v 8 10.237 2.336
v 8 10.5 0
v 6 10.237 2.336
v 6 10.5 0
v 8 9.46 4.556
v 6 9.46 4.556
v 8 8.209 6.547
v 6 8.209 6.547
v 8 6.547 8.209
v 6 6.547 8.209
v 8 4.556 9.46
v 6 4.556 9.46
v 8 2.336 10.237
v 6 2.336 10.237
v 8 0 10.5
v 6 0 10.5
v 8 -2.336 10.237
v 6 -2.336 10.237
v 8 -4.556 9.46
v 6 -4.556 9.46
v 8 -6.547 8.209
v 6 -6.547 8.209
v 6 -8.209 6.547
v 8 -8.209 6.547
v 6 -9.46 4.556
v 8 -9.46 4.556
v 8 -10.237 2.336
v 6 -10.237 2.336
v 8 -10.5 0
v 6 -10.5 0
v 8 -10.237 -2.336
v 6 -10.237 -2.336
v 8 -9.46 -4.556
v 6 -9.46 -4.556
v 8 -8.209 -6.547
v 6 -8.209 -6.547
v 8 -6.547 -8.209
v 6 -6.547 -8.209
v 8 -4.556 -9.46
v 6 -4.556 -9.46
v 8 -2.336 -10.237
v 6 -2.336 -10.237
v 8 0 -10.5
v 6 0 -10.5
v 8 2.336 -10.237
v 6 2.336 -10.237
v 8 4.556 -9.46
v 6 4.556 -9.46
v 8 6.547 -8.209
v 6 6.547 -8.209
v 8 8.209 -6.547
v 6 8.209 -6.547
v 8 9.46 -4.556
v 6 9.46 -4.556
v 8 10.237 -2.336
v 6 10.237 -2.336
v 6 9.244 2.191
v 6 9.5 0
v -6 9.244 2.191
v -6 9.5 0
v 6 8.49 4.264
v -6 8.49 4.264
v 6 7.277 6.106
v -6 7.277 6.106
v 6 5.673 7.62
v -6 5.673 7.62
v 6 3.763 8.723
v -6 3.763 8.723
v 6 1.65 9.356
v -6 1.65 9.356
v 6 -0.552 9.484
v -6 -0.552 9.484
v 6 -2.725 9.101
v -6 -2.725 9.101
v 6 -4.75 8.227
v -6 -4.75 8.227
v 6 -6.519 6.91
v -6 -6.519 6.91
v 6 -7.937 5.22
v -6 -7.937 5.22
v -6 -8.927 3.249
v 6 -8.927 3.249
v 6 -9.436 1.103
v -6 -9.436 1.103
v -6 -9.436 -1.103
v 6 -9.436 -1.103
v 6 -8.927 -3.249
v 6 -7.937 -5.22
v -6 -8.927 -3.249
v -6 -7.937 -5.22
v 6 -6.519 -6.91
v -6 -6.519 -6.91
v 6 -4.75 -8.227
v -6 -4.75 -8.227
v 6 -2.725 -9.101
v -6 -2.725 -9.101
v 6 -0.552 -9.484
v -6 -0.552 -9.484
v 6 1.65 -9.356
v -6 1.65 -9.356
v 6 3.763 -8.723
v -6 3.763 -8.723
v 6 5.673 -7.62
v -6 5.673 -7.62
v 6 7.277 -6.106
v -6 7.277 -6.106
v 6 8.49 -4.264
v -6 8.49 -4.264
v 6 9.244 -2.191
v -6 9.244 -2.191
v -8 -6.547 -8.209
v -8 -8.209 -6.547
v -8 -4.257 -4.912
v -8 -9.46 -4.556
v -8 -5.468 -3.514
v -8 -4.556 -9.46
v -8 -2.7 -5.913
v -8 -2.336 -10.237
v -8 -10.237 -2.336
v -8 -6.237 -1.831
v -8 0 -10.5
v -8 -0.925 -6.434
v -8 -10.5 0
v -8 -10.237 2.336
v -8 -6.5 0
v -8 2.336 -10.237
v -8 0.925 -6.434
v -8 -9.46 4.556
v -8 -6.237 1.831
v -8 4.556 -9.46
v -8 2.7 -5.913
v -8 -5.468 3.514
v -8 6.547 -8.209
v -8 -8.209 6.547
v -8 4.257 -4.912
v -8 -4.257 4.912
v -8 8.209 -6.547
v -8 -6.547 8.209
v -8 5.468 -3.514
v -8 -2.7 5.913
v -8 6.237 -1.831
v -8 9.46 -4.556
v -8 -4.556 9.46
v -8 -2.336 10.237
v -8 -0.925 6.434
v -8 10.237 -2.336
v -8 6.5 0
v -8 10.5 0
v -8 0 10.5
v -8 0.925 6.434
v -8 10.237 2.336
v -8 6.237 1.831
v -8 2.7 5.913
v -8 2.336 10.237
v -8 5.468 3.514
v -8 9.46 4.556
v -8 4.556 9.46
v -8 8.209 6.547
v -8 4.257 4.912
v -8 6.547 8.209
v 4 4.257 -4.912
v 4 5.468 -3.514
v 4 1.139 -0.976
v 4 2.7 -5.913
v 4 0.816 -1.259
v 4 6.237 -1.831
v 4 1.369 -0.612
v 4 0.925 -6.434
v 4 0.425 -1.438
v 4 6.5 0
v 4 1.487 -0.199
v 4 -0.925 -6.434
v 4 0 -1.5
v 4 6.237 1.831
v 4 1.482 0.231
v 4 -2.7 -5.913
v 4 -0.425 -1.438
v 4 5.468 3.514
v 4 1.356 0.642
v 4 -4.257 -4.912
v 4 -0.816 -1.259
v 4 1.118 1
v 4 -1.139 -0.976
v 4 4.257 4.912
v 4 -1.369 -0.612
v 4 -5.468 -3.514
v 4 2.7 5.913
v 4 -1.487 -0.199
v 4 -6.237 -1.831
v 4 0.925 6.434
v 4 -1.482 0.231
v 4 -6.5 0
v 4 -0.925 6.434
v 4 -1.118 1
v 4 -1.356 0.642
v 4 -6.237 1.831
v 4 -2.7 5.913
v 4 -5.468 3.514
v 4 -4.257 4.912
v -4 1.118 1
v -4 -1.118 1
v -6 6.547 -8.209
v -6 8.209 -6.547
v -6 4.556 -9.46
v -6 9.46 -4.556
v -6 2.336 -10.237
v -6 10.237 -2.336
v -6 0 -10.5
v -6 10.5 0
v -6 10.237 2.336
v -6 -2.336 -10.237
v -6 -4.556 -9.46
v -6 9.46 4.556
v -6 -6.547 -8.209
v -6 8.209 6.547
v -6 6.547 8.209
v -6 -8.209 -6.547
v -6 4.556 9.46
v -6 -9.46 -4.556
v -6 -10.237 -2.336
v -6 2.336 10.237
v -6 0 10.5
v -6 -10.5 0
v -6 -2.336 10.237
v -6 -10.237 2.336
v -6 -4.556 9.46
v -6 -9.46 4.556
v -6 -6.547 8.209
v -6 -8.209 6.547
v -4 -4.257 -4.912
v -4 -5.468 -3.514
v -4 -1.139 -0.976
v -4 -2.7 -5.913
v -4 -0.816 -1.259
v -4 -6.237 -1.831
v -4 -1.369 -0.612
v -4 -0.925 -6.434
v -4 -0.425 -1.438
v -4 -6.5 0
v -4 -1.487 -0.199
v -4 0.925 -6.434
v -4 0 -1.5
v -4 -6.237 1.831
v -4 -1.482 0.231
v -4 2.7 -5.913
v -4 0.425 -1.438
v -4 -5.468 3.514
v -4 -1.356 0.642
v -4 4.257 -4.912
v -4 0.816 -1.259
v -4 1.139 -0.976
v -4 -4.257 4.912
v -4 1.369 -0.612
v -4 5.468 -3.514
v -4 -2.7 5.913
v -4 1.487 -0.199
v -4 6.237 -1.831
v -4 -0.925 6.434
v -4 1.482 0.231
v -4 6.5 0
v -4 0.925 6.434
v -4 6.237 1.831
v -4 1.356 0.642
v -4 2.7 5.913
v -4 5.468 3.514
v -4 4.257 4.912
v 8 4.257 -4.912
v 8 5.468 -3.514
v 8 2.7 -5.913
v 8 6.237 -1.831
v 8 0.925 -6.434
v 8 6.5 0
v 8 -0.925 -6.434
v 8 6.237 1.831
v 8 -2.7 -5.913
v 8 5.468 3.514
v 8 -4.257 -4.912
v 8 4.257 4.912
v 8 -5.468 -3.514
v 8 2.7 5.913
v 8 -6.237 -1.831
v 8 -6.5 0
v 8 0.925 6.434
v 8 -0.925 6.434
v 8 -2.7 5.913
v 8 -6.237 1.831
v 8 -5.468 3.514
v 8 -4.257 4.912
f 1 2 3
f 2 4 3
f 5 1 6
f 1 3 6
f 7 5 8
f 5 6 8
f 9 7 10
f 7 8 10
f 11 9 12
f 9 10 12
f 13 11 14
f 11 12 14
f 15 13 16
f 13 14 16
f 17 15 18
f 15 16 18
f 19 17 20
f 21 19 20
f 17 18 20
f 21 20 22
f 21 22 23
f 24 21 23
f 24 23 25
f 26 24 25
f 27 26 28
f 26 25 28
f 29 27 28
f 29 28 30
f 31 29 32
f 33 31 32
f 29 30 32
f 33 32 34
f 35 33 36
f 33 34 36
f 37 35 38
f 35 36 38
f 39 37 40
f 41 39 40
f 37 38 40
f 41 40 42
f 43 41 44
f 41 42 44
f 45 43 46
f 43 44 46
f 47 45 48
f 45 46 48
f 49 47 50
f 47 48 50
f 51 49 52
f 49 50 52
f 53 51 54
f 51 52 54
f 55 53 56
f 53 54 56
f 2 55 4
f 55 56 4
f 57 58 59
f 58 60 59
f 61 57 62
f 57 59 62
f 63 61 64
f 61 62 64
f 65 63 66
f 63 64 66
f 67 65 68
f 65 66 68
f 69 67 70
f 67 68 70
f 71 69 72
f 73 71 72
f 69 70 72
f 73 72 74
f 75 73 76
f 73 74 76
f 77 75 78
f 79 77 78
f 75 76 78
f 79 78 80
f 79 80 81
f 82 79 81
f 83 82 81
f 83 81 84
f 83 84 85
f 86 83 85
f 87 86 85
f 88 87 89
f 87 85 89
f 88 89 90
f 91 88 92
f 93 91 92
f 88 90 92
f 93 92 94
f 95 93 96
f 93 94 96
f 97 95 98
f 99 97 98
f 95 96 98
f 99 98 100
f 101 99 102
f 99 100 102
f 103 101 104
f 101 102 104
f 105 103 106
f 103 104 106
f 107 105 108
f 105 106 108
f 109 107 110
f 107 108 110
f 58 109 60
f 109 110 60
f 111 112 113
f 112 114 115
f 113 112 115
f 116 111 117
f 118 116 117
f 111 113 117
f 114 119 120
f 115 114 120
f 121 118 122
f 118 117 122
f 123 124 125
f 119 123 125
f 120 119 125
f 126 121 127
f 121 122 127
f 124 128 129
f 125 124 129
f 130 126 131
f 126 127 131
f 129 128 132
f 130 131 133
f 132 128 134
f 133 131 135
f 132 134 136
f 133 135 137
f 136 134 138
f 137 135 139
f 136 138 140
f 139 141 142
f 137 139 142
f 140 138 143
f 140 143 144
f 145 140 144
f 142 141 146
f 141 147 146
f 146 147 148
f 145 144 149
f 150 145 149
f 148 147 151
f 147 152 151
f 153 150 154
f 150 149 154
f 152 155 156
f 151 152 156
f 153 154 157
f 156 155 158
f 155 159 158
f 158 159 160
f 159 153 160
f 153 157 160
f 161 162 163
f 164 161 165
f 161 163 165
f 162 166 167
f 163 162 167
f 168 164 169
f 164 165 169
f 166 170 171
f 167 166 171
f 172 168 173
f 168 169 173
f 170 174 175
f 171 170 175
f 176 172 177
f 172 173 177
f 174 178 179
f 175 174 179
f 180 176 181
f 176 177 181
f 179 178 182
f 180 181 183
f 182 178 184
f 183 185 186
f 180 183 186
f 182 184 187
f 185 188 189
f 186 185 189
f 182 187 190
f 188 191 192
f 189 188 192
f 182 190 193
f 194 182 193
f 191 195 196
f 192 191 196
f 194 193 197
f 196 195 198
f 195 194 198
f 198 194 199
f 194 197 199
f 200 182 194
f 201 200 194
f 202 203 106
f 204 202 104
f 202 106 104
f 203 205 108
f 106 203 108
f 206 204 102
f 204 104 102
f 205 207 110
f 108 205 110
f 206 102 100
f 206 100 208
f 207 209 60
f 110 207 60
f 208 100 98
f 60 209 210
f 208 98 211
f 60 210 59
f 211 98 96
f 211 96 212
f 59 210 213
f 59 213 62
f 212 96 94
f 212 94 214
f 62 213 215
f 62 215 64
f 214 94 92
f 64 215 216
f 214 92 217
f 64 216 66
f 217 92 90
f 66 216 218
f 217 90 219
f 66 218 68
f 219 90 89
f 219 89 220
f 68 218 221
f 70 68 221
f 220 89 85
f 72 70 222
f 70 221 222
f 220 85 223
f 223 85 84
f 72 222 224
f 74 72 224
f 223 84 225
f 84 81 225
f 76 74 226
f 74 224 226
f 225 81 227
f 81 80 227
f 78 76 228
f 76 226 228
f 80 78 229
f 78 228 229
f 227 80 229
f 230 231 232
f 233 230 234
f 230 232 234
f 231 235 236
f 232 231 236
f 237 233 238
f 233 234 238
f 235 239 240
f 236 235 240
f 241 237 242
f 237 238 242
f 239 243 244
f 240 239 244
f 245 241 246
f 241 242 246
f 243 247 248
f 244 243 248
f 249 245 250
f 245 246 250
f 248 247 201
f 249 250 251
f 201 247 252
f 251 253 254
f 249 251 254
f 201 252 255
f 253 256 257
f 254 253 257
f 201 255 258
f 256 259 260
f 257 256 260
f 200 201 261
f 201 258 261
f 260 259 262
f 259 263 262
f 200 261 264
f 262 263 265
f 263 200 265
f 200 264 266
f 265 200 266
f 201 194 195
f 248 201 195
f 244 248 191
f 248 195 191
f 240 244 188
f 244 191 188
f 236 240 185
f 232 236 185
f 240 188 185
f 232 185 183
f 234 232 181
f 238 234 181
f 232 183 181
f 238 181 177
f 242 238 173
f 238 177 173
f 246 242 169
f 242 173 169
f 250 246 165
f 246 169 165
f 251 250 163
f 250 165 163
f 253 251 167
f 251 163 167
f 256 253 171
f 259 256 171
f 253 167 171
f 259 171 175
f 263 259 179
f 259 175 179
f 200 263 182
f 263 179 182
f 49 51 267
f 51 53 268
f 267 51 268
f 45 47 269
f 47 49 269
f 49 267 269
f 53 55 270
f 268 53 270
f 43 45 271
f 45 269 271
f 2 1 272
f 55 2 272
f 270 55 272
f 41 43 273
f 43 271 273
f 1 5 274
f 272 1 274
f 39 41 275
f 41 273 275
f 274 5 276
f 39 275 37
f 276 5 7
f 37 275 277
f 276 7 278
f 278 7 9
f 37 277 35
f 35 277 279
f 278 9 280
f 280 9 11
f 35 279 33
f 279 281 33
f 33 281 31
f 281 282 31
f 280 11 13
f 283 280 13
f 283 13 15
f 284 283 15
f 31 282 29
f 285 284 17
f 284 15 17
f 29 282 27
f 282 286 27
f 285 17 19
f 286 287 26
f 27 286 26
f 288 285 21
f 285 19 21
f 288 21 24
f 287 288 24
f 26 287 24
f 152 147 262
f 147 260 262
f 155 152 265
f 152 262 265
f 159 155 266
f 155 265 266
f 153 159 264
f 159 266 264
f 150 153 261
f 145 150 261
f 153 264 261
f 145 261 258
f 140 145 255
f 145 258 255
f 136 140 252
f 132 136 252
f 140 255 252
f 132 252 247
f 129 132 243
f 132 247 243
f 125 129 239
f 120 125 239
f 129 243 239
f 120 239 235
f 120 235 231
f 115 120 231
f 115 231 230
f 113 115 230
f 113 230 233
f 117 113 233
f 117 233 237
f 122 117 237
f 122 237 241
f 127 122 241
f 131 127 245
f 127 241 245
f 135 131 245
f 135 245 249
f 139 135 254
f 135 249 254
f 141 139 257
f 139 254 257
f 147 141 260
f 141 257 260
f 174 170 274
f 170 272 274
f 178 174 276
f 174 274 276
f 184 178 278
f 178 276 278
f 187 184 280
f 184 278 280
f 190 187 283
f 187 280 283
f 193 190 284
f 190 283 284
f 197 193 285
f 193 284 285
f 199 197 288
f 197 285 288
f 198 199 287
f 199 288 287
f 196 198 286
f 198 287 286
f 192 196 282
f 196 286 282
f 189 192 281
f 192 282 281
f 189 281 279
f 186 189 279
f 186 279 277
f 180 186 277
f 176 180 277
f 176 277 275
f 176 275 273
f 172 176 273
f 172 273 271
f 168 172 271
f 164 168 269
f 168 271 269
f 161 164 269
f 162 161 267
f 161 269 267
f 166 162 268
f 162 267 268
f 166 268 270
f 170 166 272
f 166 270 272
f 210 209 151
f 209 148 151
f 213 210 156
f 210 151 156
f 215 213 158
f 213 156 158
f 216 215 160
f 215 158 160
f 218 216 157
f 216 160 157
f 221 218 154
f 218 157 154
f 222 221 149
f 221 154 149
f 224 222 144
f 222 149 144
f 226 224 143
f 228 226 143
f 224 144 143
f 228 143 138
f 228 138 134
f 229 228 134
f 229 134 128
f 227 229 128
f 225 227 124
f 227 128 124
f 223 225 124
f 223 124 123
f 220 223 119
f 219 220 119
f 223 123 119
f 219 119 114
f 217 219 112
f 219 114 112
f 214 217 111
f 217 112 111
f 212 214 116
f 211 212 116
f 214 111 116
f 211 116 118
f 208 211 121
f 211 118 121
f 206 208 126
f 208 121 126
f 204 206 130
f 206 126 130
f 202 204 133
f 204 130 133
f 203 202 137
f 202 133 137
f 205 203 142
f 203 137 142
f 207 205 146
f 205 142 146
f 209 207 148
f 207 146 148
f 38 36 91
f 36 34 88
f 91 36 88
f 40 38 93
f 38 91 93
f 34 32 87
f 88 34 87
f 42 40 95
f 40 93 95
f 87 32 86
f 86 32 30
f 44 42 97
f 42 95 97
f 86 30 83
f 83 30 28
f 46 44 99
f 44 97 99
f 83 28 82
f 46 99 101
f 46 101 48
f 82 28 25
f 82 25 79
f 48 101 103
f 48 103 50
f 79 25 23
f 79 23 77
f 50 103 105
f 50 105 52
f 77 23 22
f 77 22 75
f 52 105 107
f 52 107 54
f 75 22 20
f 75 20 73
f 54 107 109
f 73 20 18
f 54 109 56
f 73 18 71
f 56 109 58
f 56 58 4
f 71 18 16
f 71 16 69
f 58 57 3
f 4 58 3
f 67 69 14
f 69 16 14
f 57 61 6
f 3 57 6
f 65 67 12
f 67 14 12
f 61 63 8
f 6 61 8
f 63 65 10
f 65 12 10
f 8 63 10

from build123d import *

# Parameters (mm, degrees)
CUT_EXTRUDE1_DEPTH = 10


with BuildPart() as part:
    # Sketch1 → Revolve1 (revolve)
    with BuildSketch(Plane.XY):
        Polygon((6, 9.5), (-6, 9.5), (-6, 10.5), (-8, 10.5), (-8, 6.5), (-4, 6.5), (-4, 0), (4, 0), (4, 6.5), (8, 6.5), (8, 10.5), (6, 10.5), align=None)
    revolve(axis=Axis((-167.001765705, 0, 0), (1, 0, 0)))

    # Sketch2 → Cut-Extrude1 (cut)
    with BuildSketch(Plane(origin=(4, 0, 0), x_dir=(0, 0, -1), z_dir=(1, 0, 0))):
        with BuildLine():
            Line((-1, 1.118033989), (-1, -1.118033989))
            ThreePointArc((-1, -1.118033989), (1.5, 0), (-1, 1.118033989))
        make_face()
    extrude(amount=-CUT_EXTRUDE1_DEPTH, mode=Mode.SUBTRACT)


solid = part.part
